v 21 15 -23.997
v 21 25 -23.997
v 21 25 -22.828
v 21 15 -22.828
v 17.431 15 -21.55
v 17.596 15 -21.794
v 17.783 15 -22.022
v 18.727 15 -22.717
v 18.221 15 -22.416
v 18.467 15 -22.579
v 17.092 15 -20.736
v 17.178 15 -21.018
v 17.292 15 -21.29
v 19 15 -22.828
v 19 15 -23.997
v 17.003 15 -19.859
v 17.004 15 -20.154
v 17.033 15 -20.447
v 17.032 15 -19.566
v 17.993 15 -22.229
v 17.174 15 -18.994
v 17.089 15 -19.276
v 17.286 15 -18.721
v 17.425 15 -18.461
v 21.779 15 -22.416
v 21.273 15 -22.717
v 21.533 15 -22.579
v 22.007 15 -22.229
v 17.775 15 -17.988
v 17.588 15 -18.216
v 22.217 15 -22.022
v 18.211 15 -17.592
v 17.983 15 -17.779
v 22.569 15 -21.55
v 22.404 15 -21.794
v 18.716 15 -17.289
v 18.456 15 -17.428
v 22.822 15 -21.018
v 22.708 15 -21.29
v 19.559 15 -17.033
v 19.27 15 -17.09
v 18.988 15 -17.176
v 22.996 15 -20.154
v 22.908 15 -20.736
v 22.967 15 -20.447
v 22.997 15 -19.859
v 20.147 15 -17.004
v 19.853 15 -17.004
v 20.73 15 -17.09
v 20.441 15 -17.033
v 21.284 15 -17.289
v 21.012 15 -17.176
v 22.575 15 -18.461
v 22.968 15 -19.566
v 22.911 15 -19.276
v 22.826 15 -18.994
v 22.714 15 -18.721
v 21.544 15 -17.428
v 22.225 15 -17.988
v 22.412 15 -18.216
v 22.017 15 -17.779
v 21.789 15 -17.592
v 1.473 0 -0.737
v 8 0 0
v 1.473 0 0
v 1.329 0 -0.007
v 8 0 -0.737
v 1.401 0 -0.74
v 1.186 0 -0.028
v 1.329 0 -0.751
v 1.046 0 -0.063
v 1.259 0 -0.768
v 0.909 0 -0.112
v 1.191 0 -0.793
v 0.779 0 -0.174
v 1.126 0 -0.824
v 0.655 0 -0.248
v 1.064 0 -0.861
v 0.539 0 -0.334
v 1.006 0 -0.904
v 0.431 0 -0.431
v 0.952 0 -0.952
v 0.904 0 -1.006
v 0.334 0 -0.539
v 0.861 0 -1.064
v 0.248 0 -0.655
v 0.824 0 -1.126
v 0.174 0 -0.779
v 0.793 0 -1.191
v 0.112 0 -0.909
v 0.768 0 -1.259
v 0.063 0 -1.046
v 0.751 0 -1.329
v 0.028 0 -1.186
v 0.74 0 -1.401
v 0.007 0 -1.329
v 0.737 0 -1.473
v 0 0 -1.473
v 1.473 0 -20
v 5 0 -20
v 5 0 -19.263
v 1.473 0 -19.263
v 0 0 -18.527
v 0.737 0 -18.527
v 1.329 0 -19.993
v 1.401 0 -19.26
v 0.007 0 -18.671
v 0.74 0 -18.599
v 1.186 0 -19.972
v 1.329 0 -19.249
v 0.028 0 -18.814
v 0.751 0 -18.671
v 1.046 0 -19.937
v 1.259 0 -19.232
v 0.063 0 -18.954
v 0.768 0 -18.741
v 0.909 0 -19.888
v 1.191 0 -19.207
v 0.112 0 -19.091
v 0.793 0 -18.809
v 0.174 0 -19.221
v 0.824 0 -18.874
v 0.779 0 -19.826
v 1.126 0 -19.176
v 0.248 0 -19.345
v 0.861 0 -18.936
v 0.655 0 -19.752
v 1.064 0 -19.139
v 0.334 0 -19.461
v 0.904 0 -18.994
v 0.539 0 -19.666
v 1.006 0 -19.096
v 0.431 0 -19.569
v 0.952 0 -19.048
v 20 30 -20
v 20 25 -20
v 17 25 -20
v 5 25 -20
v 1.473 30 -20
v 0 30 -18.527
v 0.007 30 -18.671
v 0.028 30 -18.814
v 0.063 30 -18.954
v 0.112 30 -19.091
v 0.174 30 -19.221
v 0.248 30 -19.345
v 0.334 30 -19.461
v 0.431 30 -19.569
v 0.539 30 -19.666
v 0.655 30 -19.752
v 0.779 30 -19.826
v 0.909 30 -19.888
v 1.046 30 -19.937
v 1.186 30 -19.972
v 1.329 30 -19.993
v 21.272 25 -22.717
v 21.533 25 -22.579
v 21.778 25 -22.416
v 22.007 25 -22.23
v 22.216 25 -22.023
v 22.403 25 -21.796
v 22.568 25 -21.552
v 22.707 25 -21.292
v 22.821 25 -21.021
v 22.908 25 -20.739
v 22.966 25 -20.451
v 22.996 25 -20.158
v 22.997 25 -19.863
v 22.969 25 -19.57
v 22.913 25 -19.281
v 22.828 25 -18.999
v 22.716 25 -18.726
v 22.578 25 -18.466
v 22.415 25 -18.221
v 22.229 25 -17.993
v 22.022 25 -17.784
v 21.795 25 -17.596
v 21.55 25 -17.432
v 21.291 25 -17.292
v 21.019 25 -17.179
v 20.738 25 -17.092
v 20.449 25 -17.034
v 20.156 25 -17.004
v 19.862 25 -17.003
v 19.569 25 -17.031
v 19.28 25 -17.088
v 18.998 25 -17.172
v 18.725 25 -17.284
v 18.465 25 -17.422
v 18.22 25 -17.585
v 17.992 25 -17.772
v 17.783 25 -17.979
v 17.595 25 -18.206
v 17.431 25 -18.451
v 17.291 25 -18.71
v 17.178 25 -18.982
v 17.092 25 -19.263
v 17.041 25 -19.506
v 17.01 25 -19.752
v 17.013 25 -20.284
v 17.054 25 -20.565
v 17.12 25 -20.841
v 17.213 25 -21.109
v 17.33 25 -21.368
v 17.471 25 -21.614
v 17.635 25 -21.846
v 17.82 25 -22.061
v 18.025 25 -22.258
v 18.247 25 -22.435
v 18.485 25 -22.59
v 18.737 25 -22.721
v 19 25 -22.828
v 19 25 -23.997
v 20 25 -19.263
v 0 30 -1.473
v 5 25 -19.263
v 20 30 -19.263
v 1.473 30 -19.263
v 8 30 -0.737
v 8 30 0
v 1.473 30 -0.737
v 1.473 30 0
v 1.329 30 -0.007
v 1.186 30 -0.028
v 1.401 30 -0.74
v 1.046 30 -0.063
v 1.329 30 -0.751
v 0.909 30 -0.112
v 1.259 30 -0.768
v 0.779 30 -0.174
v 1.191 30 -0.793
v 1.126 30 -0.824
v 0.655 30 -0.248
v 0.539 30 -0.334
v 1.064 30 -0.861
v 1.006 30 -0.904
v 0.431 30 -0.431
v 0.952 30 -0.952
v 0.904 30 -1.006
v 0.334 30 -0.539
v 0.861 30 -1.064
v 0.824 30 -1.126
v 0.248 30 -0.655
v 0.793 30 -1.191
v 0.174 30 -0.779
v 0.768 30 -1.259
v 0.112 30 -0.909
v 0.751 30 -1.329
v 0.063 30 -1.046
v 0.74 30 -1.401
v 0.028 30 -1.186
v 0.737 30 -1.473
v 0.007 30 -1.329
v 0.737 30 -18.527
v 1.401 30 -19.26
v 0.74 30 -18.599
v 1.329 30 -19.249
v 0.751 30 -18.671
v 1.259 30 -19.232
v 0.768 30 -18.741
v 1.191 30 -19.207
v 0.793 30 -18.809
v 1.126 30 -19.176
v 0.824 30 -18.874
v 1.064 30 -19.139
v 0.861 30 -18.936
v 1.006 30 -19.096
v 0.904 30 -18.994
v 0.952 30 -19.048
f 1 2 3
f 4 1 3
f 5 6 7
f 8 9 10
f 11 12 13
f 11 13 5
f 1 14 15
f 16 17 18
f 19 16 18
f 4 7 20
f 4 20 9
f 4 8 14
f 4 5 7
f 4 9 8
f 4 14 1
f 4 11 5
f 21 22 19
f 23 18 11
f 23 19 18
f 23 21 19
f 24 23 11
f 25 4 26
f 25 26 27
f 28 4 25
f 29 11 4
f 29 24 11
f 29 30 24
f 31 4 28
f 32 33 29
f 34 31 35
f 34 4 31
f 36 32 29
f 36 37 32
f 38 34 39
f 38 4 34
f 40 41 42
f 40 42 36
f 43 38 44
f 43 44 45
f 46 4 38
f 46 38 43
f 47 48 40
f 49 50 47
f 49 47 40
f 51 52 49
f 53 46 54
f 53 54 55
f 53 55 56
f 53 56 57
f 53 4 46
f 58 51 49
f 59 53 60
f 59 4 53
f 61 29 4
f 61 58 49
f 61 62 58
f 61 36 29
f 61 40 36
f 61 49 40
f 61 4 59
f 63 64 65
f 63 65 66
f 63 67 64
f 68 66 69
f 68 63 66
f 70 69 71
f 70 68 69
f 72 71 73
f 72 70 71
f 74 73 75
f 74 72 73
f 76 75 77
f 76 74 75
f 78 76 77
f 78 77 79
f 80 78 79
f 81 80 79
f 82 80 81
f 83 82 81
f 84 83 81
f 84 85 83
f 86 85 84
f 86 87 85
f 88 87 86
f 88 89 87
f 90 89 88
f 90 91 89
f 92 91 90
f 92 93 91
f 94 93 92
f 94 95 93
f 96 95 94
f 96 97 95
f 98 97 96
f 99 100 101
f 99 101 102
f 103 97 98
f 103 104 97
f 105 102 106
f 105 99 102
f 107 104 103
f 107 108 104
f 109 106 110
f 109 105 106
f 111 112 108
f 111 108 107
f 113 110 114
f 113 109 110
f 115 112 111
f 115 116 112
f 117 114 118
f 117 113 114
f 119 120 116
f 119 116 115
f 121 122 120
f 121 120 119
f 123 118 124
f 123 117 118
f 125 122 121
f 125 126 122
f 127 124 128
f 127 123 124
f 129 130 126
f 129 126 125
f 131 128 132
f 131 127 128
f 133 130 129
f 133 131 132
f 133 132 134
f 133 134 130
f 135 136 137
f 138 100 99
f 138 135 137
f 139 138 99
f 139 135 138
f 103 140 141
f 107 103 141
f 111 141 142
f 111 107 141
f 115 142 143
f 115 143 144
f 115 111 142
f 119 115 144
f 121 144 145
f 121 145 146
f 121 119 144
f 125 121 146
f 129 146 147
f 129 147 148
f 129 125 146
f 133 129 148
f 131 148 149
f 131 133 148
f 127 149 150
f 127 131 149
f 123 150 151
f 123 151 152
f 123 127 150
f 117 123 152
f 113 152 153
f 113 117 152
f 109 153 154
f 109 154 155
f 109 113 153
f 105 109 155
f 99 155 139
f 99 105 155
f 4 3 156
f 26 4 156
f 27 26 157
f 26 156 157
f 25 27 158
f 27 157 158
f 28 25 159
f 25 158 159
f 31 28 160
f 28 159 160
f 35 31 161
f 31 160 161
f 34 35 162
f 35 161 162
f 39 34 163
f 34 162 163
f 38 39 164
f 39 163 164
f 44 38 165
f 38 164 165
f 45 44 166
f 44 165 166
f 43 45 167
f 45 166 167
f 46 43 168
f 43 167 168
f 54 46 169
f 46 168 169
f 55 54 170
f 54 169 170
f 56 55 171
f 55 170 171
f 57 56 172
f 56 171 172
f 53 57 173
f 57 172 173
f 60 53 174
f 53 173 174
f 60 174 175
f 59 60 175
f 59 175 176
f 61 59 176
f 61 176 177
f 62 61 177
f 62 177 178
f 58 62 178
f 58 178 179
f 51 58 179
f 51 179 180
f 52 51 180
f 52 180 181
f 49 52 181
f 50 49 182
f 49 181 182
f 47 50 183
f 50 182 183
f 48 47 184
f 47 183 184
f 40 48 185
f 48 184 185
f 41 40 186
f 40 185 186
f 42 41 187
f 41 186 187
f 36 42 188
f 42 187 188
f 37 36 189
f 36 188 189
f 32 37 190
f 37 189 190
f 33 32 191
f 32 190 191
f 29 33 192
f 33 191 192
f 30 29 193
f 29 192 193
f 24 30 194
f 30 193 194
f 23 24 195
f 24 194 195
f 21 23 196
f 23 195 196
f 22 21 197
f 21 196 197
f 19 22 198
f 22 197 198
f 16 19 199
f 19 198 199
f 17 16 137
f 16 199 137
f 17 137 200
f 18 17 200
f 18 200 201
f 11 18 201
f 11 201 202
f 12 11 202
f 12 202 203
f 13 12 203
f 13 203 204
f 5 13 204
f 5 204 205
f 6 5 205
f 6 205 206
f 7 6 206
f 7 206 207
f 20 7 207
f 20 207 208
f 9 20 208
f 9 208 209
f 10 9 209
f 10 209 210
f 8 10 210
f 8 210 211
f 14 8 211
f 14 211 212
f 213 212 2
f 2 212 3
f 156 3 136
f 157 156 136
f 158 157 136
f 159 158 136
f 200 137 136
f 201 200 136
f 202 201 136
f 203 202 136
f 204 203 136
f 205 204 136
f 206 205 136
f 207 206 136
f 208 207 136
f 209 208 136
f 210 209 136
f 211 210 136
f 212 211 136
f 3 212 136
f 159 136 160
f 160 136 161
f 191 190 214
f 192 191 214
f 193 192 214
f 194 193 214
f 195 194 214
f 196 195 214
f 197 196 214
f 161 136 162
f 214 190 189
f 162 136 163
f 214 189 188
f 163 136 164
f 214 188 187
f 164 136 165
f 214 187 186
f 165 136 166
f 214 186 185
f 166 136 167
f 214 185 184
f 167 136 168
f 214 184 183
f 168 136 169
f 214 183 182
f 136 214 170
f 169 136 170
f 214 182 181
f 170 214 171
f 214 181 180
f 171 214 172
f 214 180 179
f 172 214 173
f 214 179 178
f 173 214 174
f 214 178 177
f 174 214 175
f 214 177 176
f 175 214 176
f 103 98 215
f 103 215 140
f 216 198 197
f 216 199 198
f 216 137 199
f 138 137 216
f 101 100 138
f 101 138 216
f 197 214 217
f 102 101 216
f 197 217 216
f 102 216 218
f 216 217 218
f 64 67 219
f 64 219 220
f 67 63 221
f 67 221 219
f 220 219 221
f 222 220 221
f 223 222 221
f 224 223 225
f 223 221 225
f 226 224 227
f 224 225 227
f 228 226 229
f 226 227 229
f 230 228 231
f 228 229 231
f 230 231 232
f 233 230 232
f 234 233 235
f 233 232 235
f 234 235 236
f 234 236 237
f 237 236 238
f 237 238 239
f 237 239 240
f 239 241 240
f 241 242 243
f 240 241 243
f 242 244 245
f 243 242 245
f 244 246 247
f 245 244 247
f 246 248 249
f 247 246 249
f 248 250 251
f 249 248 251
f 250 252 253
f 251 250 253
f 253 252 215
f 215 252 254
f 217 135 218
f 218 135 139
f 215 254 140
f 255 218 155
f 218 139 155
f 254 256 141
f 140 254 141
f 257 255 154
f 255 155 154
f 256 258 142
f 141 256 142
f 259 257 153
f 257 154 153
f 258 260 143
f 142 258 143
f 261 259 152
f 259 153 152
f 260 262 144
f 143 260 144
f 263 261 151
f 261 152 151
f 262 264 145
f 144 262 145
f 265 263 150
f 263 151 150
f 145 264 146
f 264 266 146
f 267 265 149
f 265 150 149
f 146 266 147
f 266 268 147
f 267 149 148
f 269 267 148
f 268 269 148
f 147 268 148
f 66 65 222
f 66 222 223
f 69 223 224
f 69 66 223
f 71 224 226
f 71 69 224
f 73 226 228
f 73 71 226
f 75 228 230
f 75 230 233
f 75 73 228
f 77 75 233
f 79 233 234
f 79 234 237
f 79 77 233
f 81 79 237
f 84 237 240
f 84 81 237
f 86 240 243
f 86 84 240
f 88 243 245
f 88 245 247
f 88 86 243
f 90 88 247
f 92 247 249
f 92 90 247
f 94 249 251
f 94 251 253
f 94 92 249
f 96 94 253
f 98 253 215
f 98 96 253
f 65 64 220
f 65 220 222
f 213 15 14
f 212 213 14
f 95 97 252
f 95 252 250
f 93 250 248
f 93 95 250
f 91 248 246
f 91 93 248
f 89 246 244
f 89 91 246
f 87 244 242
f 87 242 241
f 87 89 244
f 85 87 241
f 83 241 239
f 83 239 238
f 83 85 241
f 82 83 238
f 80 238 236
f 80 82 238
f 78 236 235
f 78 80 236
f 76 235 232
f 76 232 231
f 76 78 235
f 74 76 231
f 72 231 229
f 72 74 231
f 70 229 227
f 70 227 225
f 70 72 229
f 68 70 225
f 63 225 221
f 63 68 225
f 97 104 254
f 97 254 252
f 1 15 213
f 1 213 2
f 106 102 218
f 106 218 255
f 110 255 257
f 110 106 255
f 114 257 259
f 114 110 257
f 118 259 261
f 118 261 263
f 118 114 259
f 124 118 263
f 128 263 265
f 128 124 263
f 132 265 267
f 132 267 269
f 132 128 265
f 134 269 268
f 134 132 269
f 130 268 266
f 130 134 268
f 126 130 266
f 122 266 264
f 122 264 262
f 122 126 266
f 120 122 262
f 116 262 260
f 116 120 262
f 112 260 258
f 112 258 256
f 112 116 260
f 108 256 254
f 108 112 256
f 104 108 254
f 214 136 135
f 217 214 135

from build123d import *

# Parameters (mm, degrees)
BASE_FLANGE1_DEPTH  = 30
SKETCH6_W           = 15
SKETCH6_H           = 5
TAB1_DEPTH          = 0.7366
SKETCH9_R           = 3
SKETCH9_W           = 2
SKETCH9_H           = 1.993597438
BOSS_EXTRUDE1_DEPTH = 10


# Sheet-metal steps are written as plain solids
with BuildPart() as part:
    # Sketch1 → Base-Flange1 (new body)
    with BuildSketch(Plane(origin=(0, 0, 0), x_dir=(1, 0, 0), z_dir=(0, 1, 0))):
        with BuildLine():
            Line((8, 0), (1.4732, 0))
            ThreePointArc((1.4732, 0), (0.43149029, 0.43149029), (0, 1.4732))
            Line((0, 1.4732), (0, 18.5268))
            ThreePointArc((0, 18.5268), (0.43149029, 19.56850971), (1.4732, 20))
            Line((1.4732, 20), (5, 20))
            Line((5, 20), (5, 19.2634))
            Line((5, 19.2634), (1.4732, 19.2634))
            ThreePointArc((1.4732, 19.2634), (0.952345145, 19.047654855), (0.7366, 18.5268))
            Line((0.7366, 18.5268), (0.7366, 1.4732))
            ThreePointArc((0.7366, 1.4732), (0.952345145, 0.952345145), (1.4732, 0.7366))
            Line((1.4732, 0.7366), (8, 0.7366))
            Line((8, 0.7366), (8, 0))
        make_face()
    extrude(amount=BASE_FLANGE1_DEPTH)

    # Sketch6 → Tab1 (add)
    with BuildSketch(Plane(origin=(0, 0, -20), x_dir=(-1, 0, 0), z_dir=(0, 0, -1))):
        with Locations((-12.5, 27.5)):
            Rectangle(SKETCH6_W, SKETCH6_H)
    extrude(amount=-TAB1_DEPTH)

    # Sketch9 → Boss-Extrude1 (add)
    with BuildSketch(Plane.XZ.offset(-25)):
        with Locations((20, -20)):
            Circle(SKETCH9_R)
        with Locations((20, -23)):
            Rectangle(SKETCH9_W, SKETCH9_H)
    extrude(amount=BOSS_EXTRUDE1_DEPTH)


solid = part.part
